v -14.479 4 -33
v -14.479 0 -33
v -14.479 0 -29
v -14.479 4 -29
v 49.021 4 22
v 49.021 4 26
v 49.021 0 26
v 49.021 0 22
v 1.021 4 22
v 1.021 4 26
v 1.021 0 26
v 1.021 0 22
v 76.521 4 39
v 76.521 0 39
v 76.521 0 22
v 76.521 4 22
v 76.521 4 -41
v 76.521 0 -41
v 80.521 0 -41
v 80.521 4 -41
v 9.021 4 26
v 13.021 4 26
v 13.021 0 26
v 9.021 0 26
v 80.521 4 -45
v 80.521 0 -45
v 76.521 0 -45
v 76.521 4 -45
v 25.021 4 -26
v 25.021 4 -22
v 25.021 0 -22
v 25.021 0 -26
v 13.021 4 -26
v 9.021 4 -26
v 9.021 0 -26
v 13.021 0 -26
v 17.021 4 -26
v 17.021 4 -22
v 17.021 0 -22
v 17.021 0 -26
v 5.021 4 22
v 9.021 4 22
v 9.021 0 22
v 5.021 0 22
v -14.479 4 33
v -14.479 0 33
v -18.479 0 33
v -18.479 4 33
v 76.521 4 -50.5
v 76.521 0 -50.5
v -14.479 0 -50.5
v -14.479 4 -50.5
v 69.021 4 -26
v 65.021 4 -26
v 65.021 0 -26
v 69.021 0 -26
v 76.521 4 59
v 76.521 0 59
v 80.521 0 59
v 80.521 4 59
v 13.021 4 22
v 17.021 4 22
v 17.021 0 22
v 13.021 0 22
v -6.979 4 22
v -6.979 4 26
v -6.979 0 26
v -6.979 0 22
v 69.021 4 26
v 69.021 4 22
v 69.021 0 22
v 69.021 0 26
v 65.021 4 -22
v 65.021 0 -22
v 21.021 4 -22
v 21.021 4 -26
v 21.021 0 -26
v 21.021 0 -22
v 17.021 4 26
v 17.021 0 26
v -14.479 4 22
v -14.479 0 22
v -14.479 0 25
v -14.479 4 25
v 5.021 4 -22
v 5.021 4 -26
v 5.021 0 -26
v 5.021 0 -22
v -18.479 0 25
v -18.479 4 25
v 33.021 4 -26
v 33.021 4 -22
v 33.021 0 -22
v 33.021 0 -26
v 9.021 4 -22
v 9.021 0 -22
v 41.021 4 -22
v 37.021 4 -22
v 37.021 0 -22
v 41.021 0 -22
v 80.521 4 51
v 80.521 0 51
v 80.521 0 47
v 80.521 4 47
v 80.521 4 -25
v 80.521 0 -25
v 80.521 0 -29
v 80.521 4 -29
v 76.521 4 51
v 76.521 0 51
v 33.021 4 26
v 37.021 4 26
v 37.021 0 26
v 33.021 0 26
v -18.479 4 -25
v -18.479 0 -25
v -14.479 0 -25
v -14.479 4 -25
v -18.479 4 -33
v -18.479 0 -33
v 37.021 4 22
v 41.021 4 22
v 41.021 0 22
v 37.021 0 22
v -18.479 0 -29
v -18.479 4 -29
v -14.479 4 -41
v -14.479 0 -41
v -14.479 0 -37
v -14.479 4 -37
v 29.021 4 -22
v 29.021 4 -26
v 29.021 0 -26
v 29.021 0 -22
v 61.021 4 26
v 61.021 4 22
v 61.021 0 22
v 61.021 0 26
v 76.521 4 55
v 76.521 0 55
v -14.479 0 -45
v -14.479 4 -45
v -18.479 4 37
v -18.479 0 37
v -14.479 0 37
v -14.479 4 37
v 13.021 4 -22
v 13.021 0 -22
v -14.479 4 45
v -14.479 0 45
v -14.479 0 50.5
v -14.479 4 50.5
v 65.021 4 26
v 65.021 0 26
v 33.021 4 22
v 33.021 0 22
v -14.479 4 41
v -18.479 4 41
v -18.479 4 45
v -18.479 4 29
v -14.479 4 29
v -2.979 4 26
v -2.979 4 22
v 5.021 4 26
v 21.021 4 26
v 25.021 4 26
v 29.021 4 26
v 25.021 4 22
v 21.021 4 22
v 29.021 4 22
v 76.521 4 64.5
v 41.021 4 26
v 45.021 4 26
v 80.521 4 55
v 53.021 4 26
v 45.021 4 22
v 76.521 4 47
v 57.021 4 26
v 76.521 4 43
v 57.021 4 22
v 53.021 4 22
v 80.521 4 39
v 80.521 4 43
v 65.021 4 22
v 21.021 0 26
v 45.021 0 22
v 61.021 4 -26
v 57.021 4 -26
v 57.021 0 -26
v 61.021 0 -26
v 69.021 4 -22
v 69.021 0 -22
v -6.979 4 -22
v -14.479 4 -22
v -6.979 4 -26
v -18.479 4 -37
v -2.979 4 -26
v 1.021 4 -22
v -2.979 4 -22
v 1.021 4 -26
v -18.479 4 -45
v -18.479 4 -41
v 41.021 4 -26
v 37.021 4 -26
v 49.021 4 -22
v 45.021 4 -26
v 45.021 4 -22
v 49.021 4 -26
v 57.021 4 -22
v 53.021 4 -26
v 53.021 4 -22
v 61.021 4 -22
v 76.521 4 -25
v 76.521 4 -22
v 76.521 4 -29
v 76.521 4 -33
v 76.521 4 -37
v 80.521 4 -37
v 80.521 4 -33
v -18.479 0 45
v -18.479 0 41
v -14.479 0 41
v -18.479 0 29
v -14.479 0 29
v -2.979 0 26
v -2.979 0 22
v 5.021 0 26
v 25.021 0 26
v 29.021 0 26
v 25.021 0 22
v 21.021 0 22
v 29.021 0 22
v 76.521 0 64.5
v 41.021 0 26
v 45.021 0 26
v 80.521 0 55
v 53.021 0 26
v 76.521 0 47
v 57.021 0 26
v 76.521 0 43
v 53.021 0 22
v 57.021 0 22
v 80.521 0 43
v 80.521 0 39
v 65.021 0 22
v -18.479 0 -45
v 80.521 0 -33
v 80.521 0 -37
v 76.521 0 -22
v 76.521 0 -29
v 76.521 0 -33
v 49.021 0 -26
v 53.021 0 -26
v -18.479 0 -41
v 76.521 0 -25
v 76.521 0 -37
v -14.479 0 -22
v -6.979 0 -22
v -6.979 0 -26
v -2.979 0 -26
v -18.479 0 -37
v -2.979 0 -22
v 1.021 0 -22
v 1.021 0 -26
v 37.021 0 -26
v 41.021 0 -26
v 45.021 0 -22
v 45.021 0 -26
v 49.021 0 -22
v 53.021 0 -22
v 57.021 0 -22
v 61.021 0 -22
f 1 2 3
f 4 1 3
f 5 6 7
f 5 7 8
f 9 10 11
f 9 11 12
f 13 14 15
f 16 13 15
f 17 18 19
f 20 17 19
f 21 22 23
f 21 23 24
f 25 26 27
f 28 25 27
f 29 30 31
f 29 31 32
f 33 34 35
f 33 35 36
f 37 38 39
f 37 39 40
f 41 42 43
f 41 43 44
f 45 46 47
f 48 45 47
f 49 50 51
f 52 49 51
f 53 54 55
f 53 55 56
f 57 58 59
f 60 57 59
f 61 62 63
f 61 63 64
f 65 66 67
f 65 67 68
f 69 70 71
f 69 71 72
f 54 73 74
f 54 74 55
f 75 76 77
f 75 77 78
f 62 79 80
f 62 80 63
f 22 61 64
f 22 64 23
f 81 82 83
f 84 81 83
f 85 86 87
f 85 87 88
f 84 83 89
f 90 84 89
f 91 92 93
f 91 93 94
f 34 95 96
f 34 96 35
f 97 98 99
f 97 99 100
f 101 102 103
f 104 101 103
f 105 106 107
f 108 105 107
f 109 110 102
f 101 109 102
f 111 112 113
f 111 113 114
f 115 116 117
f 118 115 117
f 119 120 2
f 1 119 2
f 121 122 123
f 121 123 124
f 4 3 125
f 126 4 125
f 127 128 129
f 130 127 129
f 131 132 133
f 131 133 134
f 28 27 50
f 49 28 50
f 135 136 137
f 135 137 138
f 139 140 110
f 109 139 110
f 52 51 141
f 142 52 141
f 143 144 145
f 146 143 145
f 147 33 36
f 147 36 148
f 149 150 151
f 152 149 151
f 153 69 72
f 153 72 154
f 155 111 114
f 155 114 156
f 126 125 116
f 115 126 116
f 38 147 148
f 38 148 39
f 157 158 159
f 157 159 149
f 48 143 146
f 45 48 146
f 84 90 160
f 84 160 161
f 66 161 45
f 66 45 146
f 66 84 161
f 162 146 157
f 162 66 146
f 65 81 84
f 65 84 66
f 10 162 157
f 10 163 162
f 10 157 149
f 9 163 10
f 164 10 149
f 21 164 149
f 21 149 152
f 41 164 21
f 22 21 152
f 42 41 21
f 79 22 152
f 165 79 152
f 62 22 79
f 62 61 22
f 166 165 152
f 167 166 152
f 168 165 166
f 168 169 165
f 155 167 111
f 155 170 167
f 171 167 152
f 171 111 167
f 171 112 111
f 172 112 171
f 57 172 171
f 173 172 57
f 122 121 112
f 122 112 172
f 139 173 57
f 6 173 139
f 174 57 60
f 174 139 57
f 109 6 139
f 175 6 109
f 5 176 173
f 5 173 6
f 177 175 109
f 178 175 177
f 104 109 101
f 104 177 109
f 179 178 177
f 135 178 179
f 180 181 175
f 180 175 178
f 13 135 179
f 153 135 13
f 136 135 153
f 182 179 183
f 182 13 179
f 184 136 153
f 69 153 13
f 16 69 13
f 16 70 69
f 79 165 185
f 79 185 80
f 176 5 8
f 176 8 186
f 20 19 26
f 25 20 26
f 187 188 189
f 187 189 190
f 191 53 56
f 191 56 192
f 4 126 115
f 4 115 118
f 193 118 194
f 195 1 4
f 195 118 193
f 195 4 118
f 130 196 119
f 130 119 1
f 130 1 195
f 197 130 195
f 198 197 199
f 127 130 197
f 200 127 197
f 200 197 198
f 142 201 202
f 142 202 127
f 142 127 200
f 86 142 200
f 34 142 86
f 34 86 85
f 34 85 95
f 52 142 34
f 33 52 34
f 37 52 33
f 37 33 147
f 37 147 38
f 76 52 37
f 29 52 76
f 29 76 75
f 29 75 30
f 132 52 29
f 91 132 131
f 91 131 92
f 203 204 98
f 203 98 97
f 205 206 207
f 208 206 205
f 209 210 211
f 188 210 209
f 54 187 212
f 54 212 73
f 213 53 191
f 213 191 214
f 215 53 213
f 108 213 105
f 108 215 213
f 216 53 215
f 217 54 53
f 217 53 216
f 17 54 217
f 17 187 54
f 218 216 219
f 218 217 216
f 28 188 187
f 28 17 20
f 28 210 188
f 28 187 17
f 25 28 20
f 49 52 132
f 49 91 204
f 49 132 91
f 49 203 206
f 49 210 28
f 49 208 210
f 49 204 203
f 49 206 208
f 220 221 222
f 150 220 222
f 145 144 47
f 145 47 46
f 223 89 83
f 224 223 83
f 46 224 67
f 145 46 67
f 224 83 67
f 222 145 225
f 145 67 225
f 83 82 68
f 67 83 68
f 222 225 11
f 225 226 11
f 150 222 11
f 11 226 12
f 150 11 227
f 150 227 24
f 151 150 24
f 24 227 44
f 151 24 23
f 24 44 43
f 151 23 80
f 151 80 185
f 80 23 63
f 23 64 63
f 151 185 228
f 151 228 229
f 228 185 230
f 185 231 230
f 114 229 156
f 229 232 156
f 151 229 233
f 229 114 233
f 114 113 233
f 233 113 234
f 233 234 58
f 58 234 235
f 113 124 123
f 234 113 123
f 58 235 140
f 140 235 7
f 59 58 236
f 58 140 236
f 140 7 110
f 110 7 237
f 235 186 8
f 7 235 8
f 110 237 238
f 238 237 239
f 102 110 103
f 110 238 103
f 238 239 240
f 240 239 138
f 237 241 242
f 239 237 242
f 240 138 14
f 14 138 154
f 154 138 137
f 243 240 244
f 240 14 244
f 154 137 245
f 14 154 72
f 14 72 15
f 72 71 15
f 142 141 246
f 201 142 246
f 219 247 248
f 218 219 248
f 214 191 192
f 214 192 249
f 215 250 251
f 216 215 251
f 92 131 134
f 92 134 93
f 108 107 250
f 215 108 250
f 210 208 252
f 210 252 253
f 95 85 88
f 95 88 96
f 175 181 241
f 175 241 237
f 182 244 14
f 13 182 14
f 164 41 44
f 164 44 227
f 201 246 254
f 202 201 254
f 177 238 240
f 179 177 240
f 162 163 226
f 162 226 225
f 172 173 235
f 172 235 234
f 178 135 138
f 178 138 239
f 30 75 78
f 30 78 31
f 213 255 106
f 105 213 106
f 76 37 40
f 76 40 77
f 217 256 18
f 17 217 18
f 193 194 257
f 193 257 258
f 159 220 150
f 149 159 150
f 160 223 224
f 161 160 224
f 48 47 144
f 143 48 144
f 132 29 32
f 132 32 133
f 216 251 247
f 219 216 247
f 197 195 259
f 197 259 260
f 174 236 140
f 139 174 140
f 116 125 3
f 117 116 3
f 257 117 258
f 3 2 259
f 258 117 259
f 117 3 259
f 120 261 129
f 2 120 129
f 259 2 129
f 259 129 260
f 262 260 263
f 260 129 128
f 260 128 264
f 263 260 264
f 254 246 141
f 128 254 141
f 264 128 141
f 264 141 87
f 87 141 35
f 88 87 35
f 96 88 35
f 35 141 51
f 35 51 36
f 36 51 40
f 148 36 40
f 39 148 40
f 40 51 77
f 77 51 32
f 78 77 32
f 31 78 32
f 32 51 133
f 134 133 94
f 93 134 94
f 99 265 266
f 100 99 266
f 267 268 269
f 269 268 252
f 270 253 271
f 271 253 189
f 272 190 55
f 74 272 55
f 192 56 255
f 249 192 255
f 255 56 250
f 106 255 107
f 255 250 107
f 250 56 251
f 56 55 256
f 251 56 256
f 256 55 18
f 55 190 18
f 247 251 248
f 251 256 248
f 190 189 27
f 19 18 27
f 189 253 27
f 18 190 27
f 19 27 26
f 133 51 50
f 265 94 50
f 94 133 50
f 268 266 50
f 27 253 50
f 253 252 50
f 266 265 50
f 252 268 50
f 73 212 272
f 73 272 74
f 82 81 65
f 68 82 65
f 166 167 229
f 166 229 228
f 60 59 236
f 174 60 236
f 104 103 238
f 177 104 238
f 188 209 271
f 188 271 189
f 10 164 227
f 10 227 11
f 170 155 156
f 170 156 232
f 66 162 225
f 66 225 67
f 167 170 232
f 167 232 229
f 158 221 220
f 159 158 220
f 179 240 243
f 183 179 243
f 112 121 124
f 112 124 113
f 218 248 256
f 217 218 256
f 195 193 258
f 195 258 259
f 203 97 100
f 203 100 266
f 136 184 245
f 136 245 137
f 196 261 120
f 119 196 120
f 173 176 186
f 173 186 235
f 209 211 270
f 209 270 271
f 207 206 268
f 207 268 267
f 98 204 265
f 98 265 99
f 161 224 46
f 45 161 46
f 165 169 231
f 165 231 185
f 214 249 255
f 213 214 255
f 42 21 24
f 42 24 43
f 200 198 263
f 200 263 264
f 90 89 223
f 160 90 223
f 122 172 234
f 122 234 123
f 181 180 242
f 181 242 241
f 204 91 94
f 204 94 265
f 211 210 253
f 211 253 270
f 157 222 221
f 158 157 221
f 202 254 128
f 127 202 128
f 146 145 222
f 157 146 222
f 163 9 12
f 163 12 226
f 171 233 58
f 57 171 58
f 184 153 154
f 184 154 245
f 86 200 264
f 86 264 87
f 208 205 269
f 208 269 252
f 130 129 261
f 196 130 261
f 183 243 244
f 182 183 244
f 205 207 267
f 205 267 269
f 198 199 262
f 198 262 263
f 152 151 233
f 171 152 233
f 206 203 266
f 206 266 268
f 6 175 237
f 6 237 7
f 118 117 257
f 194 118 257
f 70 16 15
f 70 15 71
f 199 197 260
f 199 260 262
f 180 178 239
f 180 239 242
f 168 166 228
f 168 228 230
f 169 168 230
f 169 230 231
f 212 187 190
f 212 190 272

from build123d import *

# Parameters (mm, degrees)
BOSS_EXTRUDE1_DEPTH = 4
SKETCH4_W           = 141.578614927
SKETCH4_H           = 44
CUT_EXTRUDE1_DEPTH  = 4
CUT_EXTRUDE3_DEPTH  = 4


with BuildPart() as part:
    # Sketch1 → Boss-Extrude1 (new body)
    with BuildSketch(Plane(origin=(0, 0, 0), x_dir=(1, 0, 0), z_dir=(0, 1, 0))):
        Polygon((-14.478713339, 45), (-18.478713339, 45), (-18.478713339, 41), (-14.478713339, 41), (-14.478713339, 37), (-18.478713339, 37), (-18.478713339, 33), (-14.478713339, 33), (-14.478713339, 29), (-18.478713339, 29), (-18.478713339, 25), (-14.478713339, 25), (-14.478713339, -25), (-18.478713339, -25), (-18.478713339, -29), (-14.478713339, -29), (-14.478713339, -33), (-18.478713339, -33), (-18.478713339, -37), (-14.478713339, -37), (-14.478713339, -41), (-18.478713339, -41), (-18.478713339, -45), (-14.478713339, -45), (-14.478713339, -50.5), (76.521286661, -64.5), (76.521286661, -59), (80.521286661, -59), (80.521286661, -55), (76.521286661, -55), (76.521286661, -51), (80.521286661, -51), (80.521286661, -47), (76.521286661, -47), (76.521286661, -43), (80.521286661, -43), (80.521286661, -39), (76.521286661, -39), (76.521286661, 25), (80.521286661, 25), (80.521286661, 29), (76.521286661, 29), (76.521286661, 33), (80.521286661, 33), (80.521286661, 37), (76.521286661, 37), (76.521286661, 41), (80.521286661, 41), (80.521286661, 45), (76.521286661, 45), (76.521286661, 50.5), (-14.478713339, 50.5), align=None)
    extrude(amount=BOSS_EXTRUDE1_DEPTH)

    # Sketch4 → Cut-Extrude1 (cut)
    with BuildSketch(Plane(origin=(0, 4, 0), x_dir=(1, 0, 0), z_dir=(0, 1, 0))):
        with Locations((40.105465911, 0)):
            Rectangle(SKETCH4_W, SKETCH4_H)
    extrude(amount=-CUT_EXTRUDE1_DEPTH, mode=Mode.SUBTRACT)

    # Sketch5 → Cut-Extrude3 (cut)
    with BuildSketch(Plane(origin=(0, 4, 0), x_dir=(1, 0, 0), z_dir=(0, 1, 0))):
        Polygon((29.021286661, 22), (33.021286661, 22), (33.021286661, 26), (37.021286661, 26), (37.021286661, 22), (41.021286661, 22), (41.021286661, 26), (45.021286661, 26), (45.021286661, 22), (49.021286661, 22), (49.021286661, 26), (53.021286661, 26), (53.021286661, 22), (57.021286661, 22), (57.021286661, 26), (61.021286661, 26), (61.021286661, 22), (65.021286661, 22), (65.021286661, 26), (69.021286661, 26), (69.021286661, 22), (73.021286661, 22), (73.021286661, 13.939001522), (-10.978713339, 13.939001522), (-10.978713339, 22), (-6.978713339, 22), (-6.978713339, 26), (-2.978713339, 26), (-2.978713339, 22), (1.021286661, 22), (1.021286661, 26), (5.021286661, 26), (5.021286661, 22), (9.021286661, 22), (9.021286661, 26), (13.021286661, 26), (13.021286661, 22), (17.021286661, 22), (17.021286661, 26), (21.021286661, 26), (21.021286661, 22), (25.021286661, 22), (25.021286661, 26), (29.021286661, 26), align=None)
        Polygon((29.021286661, -22), (29.021286661, -26), (25.021286661, -26), (25.021286661, -22), (21.021286661, -22), (21.021286661, -26), (17.021286661, -26), (17.021286661, -22), (13.021286661, -22), (13.021286661, -26), (9.021286661, -26), (9.021286661, -22), (5.021286661, -22), (5.021286661, -26), (1.021286661, -26), (1.021286661, -22), (-2.978713339, -22), (-2.978713339, -26), (-6.978713339, -26), (-6.978713339, -22), (-10.978713339, -22), (-10.978713339, -13.939001522), (73.021286661, -13.939001522), (73.021286661, -22), (69.021286661, -22), (69.021286661, -26), (65.021286661, -26), (65.021286661, -22), (61.021286661, -22), (61.021286661, -26), (57.021286661, -26), (57.021286661, -22), (53.021286661, -22), (53.021286661, -26), (49.021286661, -26), (49.021286661, -22), (45.021286661, -22), (45.021286661, -26), (41.021286661, -26), (41.021286661, -22), (37.021286661, -22), (37.021286661, -26), (33.021286661, -26), (33.021286661, -22), align=None)
    extrude(amount=-CUT_EXTRUDE3_DEPTH, mode=Mode.SUBTRACT)


solid = part.part
